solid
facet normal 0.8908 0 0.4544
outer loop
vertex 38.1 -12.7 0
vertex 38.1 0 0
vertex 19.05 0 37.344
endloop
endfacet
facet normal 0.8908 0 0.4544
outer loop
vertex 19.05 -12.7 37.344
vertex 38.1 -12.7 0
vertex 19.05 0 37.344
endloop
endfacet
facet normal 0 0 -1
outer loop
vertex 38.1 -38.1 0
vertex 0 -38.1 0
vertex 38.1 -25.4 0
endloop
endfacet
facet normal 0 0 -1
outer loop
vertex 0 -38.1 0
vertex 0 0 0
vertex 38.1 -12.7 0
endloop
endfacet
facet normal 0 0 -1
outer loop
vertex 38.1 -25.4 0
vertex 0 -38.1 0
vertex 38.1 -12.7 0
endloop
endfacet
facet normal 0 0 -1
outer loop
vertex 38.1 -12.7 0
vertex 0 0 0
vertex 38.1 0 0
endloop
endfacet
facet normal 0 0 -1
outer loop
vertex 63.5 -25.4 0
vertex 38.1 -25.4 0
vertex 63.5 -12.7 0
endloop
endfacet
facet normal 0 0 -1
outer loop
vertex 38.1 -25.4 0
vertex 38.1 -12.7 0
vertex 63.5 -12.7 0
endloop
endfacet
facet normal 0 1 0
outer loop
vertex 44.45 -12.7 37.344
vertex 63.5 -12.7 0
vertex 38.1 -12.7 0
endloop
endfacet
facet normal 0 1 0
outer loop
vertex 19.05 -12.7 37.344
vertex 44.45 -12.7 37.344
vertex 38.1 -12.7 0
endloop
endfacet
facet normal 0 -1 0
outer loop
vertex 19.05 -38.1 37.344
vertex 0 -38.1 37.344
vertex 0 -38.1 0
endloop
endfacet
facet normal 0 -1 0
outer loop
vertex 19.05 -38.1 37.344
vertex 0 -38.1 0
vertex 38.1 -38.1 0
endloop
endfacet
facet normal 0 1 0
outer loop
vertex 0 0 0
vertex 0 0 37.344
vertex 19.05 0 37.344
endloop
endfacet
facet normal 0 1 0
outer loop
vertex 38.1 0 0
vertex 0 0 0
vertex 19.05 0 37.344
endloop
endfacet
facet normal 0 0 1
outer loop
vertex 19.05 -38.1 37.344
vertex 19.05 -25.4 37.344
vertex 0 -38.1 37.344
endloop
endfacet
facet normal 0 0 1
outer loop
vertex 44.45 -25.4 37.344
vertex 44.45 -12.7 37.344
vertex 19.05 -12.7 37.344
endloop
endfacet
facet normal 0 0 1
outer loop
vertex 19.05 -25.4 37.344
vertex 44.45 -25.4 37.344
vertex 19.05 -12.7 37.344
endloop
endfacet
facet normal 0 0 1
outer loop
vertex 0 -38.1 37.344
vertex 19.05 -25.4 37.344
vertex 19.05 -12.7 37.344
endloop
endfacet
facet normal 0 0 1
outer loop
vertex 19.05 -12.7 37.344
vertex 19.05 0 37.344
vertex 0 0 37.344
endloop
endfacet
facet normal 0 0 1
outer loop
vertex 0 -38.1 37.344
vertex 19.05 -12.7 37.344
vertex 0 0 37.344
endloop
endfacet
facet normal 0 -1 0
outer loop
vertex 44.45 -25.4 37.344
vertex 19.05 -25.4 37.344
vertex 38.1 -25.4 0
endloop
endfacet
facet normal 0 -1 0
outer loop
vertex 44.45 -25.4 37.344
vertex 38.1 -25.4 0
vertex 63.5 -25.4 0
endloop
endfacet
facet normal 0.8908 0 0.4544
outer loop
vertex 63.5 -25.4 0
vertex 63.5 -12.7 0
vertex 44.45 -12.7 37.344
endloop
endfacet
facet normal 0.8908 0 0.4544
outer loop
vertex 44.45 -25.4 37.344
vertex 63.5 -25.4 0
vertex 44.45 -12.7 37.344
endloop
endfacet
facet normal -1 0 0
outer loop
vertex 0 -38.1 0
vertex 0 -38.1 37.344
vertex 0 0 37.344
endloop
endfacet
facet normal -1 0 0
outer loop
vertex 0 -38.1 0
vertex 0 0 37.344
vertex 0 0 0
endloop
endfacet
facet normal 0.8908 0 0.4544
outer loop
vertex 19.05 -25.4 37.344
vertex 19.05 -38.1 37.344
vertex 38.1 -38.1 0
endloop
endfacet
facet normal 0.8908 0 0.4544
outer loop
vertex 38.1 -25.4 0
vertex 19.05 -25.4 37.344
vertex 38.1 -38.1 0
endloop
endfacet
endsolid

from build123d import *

# Parameters (mm, degrees)
F1_DEPTH = 38.1
F3_DEPTH = 12.7
F5_DEPTH = 12.7


with BuildPart() as f1:
    # F0 (on Front) → F1 (new body)
    with BuildSketch(Plane.XZ):
        Polygon((0, 37.344047), (0, 0), (63.5, 0), (44.45, 37.344047), align=None)
    extrude(amount=F1_DEPTH)

    # F2 (on face) → F3 (cut)
    with BuildSketch(Plane.XZ.offset(38.1)):
        Polygon((44.45, 37.344047), (19.05, 37.344047), (38.1, 0), (63.5, 0), align=None)
    extrude(amount=-F3_DEPTH, mode=Mode.SUBTRACT)

    # F4 (on face) → F5 (cut)
    with BuildSketch(Plane(origin=(0, 0, 0), x_dir=(-1, 0, 0), z_dir=(0, 1, 0))):
        Polygon((-38.1, 0), (-19.05, 37.344047), (-44.45, 37.344047), (-63.5, 0), align=None)
    extrude(amount=-F5_DEPTH, mode=Mode.SUBTRACT)


solid = f1.part
